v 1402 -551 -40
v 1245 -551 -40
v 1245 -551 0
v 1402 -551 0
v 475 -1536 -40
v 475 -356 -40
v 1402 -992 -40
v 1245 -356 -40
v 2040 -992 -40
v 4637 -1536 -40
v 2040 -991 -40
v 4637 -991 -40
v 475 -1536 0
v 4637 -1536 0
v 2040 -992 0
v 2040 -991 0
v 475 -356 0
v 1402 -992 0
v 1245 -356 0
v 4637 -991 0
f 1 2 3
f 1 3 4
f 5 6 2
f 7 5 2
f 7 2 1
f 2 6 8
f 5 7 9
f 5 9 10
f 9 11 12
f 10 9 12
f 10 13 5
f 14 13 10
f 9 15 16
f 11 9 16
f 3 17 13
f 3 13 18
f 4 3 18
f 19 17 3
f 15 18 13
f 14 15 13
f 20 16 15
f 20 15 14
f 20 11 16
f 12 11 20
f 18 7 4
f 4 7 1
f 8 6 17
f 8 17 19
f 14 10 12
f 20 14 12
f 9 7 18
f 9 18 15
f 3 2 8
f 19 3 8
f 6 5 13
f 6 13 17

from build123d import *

# Parameters (mm, degrees)
TABAN_FLAN_1_DEPTH          = 40
KES_EKSTR_ZYON1_DEPTH       = 6196.554858122
KES_EKSTR_ZYON1_DEPTH_BACK  = 6196.554858122
IZIM6_W                     = 472
IZIM6_H                     = 278
IZIM7_W                     = 6002
IZIM7_H                     = 9
SEKME1_DEPTH                = 40
KES_EKSTR_ZYON2_DEPTH       = 6196.554858122
KES_EKSTR_ZYON2_DEPTH_BACK  = 6196.554858122
IZIM8_W                     = 475
IZIM8_H                     = 280
KES_EKSTR_ZYON3_DEPTH       = 6196.554858122
KES_EKSTR_ZYON3_DEPTH_BACK  = 6196.554858122
IZIM10_W                    = 475
IZIM10_H                    = 50
KES_EKSTR_ZYON4_DEPTH       = 6196.554858122
KES_EKSTR_ZYON4_DEPTH_BACK  = 6196.554858122
KES_EKSTR_ZYON5_DEPTH       = 5516.351756688
KES_EKSTR_ZYON5_DEPTH_BACK  = 5516.351756688
IZIM12_W                    = 1305
IZIM12_H                    = 635
KES_EKSTR_ZYON6_DEPTH       = 5516.351756688
KES_EKSTR_ZYON6_DEPTH_BACK  = 5516.351756688
IZIM13_W                    = 1515
IZIM13_H                    = 635
KES_EKSTR_ZYON7_DEPTH       = 5516.351756688
KES_EKSTR_ZYON7_DEPTH_BACK  = 5516.351756688
KES_EKSTR_ZYON8_DEPTH       = 5045.692359302
KES_EKSTR_ZYON8_DEPTH_BACK  = 5045.692359302
IZIM15_W                    = 437
IZIM15_H                    = 635
KES_EKSTR_ZYON9_DEPTH       = 5045.692359302
KES_EKSTR_ZYON9_DEPTH_BACK  = 5045.692359302
IZIM16_W                    = 795
IZIM16_H                    = 195
IZIM16_W_2                  = 168
IZIM16_H_2                  = 545
KES_EKSTR_ZYON10_DEPTH      = 4885.942681342
KES_EKSTR_ZYON10_DEPTH_BACK = 4885.942681342
IZIM17_W                    = 638
IZIM17_H                    = 441


# Sheet-metal steps are written as plain solids
with BuildPart() as part:
    # Çizim1 → Taban-Flanş1 (new body)
    with BuildSketch(Plane.XY):
        Polygon((0, 0), (0, -964), (472, -964), (472, -1536), (6002, -1536), (6002, 0), align=None)
    extrude(amount=-TABAN_FLAN_1_DEPTH)

    # Çizim6 → Kes-Ekstrüzyon1 (cut, two sides: drawn at the far end of the back side and taken through both)
    with BuildSketch(Plane.XY.offset(-KES_EKSTR_ZYON1_DEPTH_BACK)):
        with Locations((236, -825)):
            Rectangle(IZIM6_W, IZIM6_H)
        Polygon((472, -686), (472, -964), (472, -1536), (475, -1536), (475, -686), align=None)
    extrude(amount=KES_EKSTR_ZYON1_DEPTH + KES_EKSTR_ZYON1_DEPTH_BACK, mode=Mode.SUBTRACT)

    # Çizim7 → Sekme1 (add)
    with BuildSketch(Plane.XY):
        with Locations((3001, 4.5)):
            Rectangle(IZIM7_W, IZIM7_H)
    extrude(amount=-SEKME1_DEPTH)

    # Çizim8 → Kes-Ekstrüzyon2 (cut, two sides: drawn at the far end of the back side and taken through both)
    with BuildSketch(Plane.XY.offset(-KES_EKSTR_ZYON2_DEPTH_BACK)):
        with Locations((237.5, -546)):
            Rectangle(IZIM8_W, IZIM8_H)
    extrude(amount=KES_EKSTR_ZYON2_DEPTH + KES_EKSTR_ZYON2_DEPTH_BACK, mode=Mode.SUBTRACT)

    # Çizim10 → Kes-Ekstrüzyon3 (cut, two sides: drawn at the far end of the back side and taken through both)
    with BuildSketch(Plane.XY.offset(-KES_EKSTR_ZYON3_DEPTH_BACK)):
        Polygon((6002, -356), (6002, 9), (0, 9), (0, -356), (475, -356), align=None)
        with Locations((237.5, -381)):
            Rectangle(IZIM10_W, IZIM10_H)
    extrude(amount=KES_EKSTR_ZYON3_DEPTH + KES_EKSTR_ZYON3_DEPTH_BACK, mode=Mode.SUBTRACT)

    # Çizim11 → Kes-Ekstrüzyon4 (cut, two sides: drawn at the far end of the back side and taken through both)
    with BuildSketch(Plane.XY.offset(-KES_EKSTR_ZYON4_DEPTH_BACK)):
        Polygon((5297, -356), (5297, -1349), (5207, -1349), (5207, -1536), (6002, -1536), (6002, -356), align=None)
    extrude(amount=KES_EKSTR_ZYON4_DEPTH + KES_EKSTR_ZYON4_DEPTH_BACK, mode=Mode.SUBTRACT)

    # Çizim12 → Kes-Ekstrüzyon5 (cut, two sides: drawn at the far end of the back side and taken through both)
    with BuildSketch(Plane.XY.offset(-KES_EKSTR_ZYON5_DEPTH_BACK)):
        with Locations((4644.5, -673.5)):
            Rectangle(IZIM12_W, IZIM12_H)
    extrude(amount=KES_EKSTR_ZYON5_DEPTH + KES_EKSTR_ZYON5_DEPTH_BACK, mode=Mode.SUBTRACT)

    # Çizim13 → Kes-Ekstrüzyon6 (cut, two sides: drawn at the far end of the back side and taken through both)
    with BuildSketch(Plane.XY.offset(-KES_EKSTR_ZYON6_DEPTH_BACK)):
        with Locations((3234.5, -673.5)):
            Rectangle(IZIM13_W, IZIM13_H)
    extrude(amount=KES_EKSTR_ZYON6_DEPTH + KES_EKSTR_ZYON6_DEPTH_BACK, mode=Mode.SUBTRACT)

    # Çizim14 → Kes-Ekstrüzyon7 (cut, two sides: drawn at the far end of the back side and taken through both)
    with BuildSketch(Plane.XY.offset(-KES_EKSTR_ZYON7_DEPTH_BACK)):
        Polygon((4805, -991), (4805, -1536), (5297, -1547.167726618), (5297, -991), align=None)
    extrude(amount=KES_EKSTR_ZYON7_DEPTH + KES_EKSTR_ZYON7_DEPTH_BACK, mode=Mode.SUBTRACT)

    # Çizim15 → Kes-Ekstrüzyon8 (cut, two sides: drawn at the far end of the back side and taken through both)
    with BuildSketch(Plane.XY.offset(-KES_EKSTR_ZYON8_DEPTH_BACK)):
        with Locations((2258.5, -673.5)):
            Rectangle(IZIM15_W, IZIM15_H)
    extrude(amount=KES_EKSTR_ZYON8_DEPTH + KES_EKSTR_ZYON8_DEPTH_BACK, mode=Mode.SUBTRACT)

    # Çizim16 → Kes-Ekstrüzyon9 (cut, two sides: drawn at the far end of the back side and taken through both)
    with BuildSketch(Plane.XY.offset(-KES_EKSTR_ZYON9_DEPTH_BACK)):
        with Locations((1642.5, -453.5)):
            Rectangle(IZIM16_W, IZIM16_H)
        with Locations((4721, -1263.5)):
            Rectangle(IZIM16_W_2, IZIM16_H_2)
    extrude(amount=KES_EKSTR_ZYON9_DEPTH + KES_EKSTR_ZYON9_DEPTH_BACK, mode=Mode.SUBTRACT)

    # Çizim17 → Kes-Ekstrüzyon10 (cut, two sides: drawn at the far end of the back side and taken through both)
    with BuildSketch(Plane.XY.offset(-KES_EKSTR_ZYON10_DEPTH_BACK)):
        with Locations((1721, -771.5)):
            Rectangle(IZIM17_W, IZIM17_H)
    extrude(amount=KES_EKSTR_ZYON10_DEPTH + KES_EKSTR_ZYON10_DEPTH_BACK, mode=Mode.SUBTRACT)


solid = part.part
